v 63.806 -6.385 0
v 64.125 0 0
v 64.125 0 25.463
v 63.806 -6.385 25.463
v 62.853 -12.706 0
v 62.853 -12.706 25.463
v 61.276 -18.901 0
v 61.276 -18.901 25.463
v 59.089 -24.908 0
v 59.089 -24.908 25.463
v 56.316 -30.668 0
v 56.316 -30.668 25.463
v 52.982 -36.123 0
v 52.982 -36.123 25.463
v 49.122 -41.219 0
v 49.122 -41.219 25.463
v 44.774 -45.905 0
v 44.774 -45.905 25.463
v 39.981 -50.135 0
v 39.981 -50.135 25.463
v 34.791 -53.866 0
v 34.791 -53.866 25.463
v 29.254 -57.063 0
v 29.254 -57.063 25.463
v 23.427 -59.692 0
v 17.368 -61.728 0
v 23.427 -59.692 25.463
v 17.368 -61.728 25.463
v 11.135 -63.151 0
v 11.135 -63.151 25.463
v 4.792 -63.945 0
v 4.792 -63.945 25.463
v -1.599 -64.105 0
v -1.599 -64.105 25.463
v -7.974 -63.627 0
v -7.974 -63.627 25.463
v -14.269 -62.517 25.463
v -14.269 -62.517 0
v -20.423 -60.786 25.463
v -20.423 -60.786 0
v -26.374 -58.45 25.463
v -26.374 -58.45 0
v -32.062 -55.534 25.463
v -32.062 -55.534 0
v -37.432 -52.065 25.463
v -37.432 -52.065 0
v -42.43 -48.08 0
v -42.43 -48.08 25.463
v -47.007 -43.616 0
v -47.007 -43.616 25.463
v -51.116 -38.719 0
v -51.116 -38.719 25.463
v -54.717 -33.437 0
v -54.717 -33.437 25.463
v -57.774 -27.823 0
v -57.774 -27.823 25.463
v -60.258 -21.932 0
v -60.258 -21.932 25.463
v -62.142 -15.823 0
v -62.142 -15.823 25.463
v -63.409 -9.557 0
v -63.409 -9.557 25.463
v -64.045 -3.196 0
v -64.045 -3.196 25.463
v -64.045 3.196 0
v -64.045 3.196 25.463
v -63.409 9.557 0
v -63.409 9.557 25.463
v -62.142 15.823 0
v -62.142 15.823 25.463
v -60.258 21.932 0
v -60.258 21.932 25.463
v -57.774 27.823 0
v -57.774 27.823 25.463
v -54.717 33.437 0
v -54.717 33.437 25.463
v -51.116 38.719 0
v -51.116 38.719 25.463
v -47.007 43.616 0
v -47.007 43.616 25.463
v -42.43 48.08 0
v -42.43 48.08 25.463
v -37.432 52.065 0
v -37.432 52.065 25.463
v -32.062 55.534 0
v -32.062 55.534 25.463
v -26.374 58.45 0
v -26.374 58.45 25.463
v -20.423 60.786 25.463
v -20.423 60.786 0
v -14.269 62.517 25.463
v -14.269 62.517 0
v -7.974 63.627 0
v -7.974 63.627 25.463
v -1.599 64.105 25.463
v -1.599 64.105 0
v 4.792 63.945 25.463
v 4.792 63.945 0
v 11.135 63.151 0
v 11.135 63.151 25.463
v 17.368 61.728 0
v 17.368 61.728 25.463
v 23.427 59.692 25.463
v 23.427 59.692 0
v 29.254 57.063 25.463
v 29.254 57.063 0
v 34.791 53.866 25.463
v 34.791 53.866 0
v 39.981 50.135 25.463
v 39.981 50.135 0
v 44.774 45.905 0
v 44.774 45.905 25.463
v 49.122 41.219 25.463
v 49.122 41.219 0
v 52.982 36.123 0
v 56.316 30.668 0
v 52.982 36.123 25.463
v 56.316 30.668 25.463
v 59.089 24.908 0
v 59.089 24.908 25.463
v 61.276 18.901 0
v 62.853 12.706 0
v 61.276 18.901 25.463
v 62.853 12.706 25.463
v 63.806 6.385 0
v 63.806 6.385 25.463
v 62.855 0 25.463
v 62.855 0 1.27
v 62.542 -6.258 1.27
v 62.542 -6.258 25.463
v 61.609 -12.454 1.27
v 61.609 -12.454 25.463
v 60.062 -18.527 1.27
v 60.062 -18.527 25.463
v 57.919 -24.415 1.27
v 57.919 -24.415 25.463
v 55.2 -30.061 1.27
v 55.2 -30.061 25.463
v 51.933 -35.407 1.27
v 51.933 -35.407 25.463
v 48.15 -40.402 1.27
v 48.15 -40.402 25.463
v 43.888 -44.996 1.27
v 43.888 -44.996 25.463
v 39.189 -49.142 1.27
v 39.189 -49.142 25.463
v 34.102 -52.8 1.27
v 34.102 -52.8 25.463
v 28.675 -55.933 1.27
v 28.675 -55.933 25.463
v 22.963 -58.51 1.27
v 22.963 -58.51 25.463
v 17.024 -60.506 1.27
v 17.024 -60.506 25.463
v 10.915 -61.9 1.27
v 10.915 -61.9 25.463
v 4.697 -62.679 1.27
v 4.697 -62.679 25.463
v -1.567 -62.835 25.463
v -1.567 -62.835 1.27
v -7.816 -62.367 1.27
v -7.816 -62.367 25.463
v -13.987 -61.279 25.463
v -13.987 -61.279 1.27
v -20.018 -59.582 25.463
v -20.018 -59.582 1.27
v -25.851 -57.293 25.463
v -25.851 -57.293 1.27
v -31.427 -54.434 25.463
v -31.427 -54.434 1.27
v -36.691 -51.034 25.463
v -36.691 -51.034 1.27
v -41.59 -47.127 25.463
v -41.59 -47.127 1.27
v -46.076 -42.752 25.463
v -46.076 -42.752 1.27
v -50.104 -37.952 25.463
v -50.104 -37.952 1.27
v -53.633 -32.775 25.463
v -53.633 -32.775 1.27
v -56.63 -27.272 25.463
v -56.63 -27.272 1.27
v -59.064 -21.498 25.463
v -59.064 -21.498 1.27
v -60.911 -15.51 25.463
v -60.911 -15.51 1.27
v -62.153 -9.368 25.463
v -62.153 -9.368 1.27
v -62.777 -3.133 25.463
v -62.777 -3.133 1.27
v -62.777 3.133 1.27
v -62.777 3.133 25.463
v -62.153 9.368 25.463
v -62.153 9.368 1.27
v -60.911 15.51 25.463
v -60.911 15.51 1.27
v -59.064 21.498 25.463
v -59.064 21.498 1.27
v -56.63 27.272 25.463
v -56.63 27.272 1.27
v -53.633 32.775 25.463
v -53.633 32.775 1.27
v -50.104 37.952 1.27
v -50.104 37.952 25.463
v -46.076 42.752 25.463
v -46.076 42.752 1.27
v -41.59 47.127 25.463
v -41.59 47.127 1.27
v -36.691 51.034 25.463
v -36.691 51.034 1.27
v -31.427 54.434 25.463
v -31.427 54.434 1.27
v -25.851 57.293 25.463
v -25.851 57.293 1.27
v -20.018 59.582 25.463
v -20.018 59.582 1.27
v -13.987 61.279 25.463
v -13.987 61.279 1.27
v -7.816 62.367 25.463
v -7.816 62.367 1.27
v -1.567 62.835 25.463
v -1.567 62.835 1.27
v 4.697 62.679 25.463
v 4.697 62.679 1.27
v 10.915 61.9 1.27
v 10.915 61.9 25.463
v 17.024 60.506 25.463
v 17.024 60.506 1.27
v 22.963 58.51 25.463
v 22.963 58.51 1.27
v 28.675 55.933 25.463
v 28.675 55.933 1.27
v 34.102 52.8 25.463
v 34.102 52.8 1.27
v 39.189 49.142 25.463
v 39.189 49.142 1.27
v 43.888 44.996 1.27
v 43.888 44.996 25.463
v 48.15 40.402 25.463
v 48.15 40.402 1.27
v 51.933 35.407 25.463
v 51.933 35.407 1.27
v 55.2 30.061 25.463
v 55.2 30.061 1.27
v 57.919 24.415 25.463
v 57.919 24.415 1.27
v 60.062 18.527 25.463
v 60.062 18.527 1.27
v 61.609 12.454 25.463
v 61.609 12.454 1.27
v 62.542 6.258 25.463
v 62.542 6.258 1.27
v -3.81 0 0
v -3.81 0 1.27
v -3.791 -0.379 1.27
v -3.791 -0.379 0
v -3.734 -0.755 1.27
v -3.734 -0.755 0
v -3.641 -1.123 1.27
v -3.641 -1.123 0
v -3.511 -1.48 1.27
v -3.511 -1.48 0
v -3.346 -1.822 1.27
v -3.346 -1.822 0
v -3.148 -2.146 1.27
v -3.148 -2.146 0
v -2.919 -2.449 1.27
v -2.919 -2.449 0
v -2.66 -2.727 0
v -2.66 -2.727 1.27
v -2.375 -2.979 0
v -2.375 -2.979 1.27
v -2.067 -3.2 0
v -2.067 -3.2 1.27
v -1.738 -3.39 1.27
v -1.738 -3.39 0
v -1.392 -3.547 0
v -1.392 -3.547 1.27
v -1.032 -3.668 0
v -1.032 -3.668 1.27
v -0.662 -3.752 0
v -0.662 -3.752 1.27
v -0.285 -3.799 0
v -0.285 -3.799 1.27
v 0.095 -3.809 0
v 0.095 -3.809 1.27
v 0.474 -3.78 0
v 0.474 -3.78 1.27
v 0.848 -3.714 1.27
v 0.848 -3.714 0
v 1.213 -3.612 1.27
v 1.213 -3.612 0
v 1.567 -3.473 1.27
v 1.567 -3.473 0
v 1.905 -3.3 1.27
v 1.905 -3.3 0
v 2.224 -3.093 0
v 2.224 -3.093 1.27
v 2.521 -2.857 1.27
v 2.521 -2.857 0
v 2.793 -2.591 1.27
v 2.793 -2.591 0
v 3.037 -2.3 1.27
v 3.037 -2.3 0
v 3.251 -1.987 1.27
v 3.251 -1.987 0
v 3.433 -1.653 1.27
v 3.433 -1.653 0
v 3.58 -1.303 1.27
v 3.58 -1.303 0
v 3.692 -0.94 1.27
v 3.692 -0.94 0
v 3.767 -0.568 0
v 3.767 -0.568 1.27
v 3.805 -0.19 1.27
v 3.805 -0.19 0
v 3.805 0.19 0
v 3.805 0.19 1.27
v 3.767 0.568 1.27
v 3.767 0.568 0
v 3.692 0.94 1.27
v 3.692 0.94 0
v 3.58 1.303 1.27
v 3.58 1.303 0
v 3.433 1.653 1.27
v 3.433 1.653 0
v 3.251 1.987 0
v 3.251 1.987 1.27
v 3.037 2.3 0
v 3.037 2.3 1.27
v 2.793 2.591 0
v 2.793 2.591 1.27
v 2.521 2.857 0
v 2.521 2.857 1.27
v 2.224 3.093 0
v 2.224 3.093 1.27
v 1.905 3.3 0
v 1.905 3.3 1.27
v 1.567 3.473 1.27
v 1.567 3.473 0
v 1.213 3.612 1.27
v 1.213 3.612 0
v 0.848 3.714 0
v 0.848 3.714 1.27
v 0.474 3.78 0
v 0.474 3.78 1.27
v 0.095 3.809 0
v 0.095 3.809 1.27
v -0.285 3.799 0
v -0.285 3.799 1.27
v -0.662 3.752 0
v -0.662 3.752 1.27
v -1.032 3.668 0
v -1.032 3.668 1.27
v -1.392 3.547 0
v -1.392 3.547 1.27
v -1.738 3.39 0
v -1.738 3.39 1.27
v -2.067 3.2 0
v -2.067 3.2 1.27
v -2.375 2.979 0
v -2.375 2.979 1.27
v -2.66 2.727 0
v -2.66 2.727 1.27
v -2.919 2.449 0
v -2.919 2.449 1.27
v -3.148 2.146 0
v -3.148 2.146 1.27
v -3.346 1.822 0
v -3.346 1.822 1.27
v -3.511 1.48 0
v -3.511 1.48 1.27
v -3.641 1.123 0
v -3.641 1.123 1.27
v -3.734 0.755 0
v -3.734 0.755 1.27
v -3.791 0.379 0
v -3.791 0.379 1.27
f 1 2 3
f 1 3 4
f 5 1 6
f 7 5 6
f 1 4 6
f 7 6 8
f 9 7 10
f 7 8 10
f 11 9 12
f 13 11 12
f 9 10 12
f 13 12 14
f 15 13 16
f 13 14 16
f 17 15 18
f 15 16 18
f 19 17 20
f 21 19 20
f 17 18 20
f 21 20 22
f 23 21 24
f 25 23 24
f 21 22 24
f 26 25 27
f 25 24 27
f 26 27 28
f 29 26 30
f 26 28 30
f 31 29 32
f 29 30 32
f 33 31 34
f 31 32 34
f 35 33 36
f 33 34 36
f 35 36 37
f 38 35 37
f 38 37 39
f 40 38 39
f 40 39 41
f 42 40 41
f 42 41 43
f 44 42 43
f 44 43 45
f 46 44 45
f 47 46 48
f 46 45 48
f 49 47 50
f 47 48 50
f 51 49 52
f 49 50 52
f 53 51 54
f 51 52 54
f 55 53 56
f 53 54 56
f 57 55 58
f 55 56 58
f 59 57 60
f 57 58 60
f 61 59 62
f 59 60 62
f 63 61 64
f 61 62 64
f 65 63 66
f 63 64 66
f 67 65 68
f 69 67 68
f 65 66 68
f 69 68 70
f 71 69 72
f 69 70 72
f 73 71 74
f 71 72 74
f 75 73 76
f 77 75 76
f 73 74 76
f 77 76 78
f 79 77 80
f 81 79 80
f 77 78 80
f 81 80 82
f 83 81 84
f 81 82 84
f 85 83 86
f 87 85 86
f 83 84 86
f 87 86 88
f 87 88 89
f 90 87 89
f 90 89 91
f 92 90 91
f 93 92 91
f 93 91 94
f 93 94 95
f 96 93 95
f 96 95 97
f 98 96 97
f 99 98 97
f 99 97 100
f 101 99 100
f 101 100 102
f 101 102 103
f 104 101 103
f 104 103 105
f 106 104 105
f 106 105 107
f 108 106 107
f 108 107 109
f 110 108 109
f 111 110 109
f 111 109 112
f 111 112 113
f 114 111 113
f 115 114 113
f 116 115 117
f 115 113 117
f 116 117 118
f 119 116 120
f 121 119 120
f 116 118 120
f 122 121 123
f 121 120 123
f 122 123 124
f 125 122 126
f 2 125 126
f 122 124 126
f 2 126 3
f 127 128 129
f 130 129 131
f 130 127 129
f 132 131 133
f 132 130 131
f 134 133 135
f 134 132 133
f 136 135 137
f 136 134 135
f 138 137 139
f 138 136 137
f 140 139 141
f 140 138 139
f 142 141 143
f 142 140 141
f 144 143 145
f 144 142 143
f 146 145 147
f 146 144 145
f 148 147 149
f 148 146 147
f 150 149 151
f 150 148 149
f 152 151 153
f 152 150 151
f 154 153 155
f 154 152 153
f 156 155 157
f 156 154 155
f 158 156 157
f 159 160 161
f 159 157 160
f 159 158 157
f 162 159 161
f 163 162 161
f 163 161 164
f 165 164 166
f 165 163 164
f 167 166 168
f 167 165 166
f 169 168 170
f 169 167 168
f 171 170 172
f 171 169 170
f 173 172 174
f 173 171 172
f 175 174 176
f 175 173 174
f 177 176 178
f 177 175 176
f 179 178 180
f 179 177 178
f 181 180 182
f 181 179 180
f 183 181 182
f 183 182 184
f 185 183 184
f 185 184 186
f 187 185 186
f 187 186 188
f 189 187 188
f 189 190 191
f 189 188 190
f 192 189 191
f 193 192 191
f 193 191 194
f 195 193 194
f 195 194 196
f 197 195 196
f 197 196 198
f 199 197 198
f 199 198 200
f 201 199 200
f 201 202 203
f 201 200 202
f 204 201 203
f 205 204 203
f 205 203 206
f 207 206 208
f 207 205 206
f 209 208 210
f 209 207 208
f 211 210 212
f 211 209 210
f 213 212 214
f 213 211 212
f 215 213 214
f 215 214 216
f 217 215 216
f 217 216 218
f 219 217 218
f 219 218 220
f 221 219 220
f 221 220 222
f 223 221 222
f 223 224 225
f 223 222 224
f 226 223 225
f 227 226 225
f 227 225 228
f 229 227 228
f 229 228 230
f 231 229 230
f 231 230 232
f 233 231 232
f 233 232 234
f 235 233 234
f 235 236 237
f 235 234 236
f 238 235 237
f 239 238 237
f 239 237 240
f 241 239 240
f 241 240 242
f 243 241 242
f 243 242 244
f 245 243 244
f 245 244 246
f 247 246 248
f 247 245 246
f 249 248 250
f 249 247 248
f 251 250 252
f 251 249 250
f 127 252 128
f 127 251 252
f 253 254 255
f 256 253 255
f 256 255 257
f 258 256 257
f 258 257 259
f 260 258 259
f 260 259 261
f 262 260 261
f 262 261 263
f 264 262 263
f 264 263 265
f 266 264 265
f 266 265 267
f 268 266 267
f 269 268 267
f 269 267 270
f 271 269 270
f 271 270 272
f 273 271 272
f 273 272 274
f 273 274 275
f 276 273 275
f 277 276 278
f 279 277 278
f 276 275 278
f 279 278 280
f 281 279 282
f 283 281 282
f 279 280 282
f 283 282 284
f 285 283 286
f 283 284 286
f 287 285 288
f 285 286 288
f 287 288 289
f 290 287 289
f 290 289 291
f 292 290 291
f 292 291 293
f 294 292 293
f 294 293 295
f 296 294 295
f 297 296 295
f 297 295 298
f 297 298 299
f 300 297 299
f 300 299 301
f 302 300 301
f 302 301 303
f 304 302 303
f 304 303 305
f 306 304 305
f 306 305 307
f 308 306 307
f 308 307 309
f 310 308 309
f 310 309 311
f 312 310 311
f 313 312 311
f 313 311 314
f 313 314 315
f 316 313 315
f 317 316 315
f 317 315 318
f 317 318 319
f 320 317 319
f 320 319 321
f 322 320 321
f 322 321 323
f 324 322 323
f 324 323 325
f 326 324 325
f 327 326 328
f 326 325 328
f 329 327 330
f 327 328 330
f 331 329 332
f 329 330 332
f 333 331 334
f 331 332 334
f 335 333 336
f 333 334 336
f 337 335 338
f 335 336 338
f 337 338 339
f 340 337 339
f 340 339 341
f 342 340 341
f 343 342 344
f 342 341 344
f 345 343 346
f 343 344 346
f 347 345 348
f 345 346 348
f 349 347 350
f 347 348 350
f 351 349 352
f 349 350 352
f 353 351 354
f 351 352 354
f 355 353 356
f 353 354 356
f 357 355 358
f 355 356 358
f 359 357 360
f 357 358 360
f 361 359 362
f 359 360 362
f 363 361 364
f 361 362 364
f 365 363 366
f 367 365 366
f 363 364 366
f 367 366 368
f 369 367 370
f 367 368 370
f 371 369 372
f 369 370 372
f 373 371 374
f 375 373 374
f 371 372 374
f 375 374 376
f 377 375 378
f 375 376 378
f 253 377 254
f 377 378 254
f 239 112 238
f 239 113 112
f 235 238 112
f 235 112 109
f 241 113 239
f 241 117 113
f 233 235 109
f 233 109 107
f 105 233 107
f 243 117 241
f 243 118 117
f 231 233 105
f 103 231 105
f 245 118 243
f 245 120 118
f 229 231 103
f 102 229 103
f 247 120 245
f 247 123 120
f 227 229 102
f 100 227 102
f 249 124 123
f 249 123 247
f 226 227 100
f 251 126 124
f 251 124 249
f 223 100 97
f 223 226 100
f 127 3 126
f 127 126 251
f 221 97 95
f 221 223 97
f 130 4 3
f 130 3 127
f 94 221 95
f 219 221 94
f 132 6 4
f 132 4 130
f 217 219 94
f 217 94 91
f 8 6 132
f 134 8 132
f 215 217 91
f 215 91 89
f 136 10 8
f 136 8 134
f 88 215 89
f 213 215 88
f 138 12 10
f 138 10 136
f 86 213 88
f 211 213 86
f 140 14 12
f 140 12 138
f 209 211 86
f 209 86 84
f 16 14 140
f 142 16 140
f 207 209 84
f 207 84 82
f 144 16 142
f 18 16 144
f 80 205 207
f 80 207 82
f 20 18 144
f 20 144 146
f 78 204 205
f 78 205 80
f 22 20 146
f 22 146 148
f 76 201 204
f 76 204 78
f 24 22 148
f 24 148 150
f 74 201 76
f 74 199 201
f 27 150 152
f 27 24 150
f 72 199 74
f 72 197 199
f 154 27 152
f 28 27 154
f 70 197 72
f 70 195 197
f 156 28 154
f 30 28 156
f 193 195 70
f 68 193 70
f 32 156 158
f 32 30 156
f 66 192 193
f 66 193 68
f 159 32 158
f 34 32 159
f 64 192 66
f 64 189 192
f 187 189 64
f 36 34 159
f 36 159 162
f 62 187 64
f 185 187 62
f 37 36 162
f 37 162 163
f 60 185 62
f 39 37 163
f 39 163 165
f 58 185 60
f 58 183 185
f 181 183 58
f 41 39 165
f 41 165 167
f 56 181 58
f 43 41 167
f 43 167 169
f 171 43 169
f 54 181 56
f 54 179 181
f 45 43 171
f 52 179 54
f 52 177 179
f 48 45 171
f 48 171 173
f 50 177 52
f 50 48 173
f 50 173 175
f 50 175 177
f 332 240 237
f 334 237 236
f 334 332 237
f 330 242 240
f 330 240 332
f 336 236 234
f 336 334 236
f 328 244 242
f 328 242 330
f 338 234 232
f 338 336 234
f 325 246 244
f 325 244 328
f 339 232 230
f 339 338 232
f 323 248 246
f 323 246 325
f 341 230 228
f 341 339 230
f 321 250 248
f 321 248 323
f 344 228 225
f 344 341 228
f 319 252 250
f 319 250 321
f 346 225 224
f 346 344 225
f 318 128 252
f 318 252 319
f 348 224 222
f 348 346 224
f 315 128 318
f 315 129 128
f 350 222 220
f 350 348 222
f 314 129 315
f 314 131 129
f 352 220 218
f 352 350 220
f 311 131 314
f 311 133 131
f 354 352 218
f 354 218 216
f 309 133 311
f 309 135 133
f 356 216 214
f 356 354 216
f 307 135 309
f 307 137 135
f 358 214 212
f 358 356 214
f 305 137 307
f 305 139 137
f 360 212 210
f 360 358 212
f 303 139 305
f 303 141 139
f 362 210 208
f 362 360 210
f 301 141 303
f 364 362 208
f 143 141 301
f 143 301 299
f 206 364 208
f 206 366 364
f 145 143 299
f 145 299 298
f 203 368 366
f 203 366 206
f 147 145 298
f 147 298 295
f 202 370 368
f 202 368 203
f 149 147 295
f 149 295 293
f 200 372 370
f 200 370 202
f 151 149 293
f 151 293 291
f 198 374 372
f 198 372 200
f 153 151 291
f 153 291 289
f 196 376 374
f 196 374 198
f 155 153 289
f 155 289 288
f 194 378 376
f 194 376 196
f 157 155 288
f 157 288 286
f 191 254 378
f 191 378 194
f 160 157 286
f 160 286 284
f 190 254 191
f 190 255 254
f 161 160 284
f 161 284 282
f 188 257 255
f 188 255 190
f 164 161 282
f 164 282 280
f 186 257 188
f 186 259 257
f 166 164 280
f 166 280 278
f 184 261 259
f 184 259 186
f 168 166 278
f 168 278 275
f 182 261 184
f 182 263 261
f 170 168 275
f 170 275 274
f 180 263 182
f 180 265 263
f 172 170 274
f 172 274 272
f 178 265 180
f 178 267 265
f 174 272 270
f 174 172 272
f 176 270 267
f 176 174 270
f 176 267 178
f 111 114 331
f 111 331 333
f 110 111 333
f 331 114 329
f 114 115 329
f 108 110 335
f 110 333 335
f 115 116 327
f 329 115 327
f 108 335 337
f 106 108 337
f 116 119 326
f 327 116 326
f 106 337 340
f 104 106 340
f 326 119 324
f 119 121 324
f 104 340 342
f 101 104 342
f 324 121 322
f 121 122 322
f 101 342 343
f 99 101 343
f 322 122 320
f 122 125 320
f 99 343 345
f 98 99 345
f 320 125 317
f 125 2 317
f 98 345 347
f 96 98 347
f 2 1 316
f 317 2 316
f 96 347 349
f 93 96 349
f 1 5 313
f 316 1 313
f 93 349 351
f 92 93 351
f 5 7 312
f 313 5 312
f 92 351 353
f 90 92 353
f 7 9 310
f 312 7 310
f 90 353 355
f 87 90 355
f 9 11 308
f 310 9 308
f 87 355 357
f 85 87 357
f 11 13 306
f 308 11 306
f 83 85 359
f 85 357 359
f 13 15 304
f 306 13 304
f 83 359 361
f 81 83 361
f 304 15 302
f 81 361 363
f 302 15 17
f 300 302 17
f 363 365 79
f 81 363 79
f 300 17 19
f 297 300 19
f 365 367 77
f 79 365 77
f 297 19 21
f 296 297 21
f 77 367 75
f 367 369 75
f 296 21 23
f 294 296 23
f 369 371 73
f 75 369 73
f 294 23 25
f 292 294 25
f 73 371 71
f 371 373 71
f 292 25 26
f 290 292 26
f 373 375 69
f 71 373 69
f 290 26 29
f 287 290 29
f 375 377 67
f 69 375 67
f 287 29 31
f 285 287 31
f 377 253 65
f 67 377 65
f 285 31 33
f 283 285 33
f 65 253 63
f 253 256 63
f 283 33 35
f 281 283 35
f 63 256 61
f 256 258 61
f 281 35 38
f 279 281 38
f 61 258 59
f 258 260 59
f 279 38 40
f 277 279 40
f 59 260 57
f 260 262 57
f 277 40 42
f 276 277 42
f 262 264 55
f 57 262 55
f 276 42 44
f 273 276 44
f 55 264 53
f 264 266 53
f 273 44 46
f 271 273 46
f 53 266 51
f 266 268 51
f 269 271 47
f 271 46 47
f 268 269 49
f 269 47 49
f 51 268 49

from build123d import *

# Parameters (mm, degrees)
F0_W = 64.1248
F0_H = 25.463037
F2_T = -1.27
F4_D = 7.62


with BuildPart() as f1:
    # F0 (on Front) → F1 (revolve)
    with BuildSketch(Plane.XZ):
        with Locations((32.0624, 12.731518)):
            Rectangle(F0_W, F0_H)
    revolve(axis=Axis((0, 0, 5.022522), (0, 0, -1)))

    # F2
    f2_openings = [f1.faces().sort_by_distance(p)[0] for p in [
        (0, 0, 25.463037),
    ]]
    offset(amount=F2_T, openings=f2_openings)

    # F4 (through all)
    with Locations(Plane(origin=(0, 0, 0), x_dir=(1, 0, 0), z_dir=(0, 0, -1))):
        with Locations((0, 0)):
            Hole(F4_D / 2)


solid = f1.part
